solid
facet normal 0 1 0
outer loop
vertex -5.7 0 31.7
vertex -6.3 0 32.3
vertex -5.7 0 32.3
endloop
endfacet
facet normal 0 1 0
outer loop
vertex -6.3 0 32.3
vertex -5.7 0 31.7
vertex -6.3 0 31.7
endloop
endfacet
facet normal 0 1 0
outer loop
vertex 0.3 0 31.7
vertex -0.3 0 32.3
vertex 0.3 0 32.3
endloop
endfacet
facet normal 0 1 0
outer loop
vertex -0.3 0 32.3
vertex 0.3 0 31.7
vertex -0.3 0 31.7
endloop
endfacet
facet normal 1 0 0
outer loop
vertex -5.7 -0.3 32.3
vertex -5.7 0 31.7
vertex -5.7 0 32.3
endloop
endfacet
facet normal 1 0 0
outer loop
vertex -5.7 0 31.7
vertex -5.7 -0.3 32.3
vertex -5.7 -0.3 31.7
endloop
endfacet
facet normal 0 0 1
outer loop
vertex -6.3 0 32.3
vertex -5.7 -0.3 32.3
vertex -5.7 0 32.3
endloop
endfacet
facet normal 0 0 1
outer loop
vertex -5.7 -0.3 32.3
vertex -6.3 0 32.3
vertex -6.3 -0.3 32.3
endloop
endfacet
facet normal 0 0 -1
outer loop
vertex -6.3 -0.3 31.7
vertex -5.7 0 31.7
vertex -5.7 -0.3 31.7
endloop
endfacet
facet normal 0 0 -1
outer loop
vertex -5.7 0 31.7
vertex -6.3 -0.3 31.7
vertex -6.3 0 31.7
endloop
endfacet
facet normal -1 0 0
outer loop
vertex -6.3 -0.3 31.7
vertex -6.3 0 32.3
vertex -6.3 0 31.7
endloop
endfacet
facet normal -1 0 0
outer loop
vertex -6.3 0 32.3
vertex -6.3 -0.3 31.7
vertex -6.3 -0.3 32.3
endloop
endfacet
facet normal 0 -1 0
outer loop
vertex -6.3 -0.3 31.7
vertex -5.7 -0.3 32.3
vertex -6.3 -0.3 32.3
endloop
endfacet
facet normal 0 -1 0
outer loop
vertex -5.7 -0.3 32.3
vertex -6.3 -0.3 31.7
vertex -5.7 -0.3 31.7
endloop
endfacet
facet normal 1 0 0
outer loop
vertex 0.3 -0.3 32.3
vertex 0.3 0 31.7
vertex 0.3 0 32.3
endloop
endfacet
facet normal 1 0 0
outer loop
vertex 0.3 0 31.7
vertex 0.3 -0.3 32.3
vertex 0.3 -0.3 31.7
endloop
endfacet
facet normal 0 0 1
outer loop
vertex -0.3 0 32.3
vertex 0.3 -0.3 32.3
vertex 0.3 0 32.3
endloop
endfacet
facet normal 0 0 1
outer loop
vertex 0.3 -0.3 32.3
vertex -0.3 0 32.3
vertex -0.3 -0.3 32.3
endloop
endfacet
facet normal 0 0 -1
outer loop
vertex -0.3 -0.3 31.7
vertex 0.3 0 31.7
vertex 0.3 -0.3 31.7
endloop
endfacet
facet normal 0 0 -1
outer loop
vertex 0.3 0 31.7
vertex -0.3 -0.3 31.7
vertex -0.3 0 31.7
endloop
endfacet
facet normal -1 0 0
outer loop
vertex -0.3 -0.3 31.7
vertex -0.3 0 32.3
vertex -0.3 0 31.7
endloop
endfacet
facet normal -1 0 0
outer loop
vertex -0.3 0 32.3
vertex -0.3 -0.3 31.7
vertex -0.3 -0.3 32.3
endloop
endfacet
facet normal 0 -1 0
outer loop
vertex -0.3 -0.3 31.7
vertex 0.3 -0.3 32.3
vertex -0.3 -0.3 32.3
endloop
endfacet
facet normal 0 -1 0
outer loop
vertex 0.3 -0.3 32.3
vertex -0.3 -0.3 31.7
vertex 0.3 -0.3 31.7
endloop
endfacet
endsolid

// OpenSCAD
// The Z-rail arrow must point UP (+Z): beside the stem (below centre) there
// is rail material. A down-arrow (its head would be here) or a plain
// rectangle cuts it away. Must render non-empty.
include <../stage.scad>
intersection() {
    stage_x_slider();
    for (p = [[-3, -5], [3, -5]])
        translate([xs_xc + p[0] - 0.3, col_y1 + dt_h - 0.3, xs_top + col_h / 2 + p[1] - 0.3]) cube([0.6, 0.31, 0.6]);
}
